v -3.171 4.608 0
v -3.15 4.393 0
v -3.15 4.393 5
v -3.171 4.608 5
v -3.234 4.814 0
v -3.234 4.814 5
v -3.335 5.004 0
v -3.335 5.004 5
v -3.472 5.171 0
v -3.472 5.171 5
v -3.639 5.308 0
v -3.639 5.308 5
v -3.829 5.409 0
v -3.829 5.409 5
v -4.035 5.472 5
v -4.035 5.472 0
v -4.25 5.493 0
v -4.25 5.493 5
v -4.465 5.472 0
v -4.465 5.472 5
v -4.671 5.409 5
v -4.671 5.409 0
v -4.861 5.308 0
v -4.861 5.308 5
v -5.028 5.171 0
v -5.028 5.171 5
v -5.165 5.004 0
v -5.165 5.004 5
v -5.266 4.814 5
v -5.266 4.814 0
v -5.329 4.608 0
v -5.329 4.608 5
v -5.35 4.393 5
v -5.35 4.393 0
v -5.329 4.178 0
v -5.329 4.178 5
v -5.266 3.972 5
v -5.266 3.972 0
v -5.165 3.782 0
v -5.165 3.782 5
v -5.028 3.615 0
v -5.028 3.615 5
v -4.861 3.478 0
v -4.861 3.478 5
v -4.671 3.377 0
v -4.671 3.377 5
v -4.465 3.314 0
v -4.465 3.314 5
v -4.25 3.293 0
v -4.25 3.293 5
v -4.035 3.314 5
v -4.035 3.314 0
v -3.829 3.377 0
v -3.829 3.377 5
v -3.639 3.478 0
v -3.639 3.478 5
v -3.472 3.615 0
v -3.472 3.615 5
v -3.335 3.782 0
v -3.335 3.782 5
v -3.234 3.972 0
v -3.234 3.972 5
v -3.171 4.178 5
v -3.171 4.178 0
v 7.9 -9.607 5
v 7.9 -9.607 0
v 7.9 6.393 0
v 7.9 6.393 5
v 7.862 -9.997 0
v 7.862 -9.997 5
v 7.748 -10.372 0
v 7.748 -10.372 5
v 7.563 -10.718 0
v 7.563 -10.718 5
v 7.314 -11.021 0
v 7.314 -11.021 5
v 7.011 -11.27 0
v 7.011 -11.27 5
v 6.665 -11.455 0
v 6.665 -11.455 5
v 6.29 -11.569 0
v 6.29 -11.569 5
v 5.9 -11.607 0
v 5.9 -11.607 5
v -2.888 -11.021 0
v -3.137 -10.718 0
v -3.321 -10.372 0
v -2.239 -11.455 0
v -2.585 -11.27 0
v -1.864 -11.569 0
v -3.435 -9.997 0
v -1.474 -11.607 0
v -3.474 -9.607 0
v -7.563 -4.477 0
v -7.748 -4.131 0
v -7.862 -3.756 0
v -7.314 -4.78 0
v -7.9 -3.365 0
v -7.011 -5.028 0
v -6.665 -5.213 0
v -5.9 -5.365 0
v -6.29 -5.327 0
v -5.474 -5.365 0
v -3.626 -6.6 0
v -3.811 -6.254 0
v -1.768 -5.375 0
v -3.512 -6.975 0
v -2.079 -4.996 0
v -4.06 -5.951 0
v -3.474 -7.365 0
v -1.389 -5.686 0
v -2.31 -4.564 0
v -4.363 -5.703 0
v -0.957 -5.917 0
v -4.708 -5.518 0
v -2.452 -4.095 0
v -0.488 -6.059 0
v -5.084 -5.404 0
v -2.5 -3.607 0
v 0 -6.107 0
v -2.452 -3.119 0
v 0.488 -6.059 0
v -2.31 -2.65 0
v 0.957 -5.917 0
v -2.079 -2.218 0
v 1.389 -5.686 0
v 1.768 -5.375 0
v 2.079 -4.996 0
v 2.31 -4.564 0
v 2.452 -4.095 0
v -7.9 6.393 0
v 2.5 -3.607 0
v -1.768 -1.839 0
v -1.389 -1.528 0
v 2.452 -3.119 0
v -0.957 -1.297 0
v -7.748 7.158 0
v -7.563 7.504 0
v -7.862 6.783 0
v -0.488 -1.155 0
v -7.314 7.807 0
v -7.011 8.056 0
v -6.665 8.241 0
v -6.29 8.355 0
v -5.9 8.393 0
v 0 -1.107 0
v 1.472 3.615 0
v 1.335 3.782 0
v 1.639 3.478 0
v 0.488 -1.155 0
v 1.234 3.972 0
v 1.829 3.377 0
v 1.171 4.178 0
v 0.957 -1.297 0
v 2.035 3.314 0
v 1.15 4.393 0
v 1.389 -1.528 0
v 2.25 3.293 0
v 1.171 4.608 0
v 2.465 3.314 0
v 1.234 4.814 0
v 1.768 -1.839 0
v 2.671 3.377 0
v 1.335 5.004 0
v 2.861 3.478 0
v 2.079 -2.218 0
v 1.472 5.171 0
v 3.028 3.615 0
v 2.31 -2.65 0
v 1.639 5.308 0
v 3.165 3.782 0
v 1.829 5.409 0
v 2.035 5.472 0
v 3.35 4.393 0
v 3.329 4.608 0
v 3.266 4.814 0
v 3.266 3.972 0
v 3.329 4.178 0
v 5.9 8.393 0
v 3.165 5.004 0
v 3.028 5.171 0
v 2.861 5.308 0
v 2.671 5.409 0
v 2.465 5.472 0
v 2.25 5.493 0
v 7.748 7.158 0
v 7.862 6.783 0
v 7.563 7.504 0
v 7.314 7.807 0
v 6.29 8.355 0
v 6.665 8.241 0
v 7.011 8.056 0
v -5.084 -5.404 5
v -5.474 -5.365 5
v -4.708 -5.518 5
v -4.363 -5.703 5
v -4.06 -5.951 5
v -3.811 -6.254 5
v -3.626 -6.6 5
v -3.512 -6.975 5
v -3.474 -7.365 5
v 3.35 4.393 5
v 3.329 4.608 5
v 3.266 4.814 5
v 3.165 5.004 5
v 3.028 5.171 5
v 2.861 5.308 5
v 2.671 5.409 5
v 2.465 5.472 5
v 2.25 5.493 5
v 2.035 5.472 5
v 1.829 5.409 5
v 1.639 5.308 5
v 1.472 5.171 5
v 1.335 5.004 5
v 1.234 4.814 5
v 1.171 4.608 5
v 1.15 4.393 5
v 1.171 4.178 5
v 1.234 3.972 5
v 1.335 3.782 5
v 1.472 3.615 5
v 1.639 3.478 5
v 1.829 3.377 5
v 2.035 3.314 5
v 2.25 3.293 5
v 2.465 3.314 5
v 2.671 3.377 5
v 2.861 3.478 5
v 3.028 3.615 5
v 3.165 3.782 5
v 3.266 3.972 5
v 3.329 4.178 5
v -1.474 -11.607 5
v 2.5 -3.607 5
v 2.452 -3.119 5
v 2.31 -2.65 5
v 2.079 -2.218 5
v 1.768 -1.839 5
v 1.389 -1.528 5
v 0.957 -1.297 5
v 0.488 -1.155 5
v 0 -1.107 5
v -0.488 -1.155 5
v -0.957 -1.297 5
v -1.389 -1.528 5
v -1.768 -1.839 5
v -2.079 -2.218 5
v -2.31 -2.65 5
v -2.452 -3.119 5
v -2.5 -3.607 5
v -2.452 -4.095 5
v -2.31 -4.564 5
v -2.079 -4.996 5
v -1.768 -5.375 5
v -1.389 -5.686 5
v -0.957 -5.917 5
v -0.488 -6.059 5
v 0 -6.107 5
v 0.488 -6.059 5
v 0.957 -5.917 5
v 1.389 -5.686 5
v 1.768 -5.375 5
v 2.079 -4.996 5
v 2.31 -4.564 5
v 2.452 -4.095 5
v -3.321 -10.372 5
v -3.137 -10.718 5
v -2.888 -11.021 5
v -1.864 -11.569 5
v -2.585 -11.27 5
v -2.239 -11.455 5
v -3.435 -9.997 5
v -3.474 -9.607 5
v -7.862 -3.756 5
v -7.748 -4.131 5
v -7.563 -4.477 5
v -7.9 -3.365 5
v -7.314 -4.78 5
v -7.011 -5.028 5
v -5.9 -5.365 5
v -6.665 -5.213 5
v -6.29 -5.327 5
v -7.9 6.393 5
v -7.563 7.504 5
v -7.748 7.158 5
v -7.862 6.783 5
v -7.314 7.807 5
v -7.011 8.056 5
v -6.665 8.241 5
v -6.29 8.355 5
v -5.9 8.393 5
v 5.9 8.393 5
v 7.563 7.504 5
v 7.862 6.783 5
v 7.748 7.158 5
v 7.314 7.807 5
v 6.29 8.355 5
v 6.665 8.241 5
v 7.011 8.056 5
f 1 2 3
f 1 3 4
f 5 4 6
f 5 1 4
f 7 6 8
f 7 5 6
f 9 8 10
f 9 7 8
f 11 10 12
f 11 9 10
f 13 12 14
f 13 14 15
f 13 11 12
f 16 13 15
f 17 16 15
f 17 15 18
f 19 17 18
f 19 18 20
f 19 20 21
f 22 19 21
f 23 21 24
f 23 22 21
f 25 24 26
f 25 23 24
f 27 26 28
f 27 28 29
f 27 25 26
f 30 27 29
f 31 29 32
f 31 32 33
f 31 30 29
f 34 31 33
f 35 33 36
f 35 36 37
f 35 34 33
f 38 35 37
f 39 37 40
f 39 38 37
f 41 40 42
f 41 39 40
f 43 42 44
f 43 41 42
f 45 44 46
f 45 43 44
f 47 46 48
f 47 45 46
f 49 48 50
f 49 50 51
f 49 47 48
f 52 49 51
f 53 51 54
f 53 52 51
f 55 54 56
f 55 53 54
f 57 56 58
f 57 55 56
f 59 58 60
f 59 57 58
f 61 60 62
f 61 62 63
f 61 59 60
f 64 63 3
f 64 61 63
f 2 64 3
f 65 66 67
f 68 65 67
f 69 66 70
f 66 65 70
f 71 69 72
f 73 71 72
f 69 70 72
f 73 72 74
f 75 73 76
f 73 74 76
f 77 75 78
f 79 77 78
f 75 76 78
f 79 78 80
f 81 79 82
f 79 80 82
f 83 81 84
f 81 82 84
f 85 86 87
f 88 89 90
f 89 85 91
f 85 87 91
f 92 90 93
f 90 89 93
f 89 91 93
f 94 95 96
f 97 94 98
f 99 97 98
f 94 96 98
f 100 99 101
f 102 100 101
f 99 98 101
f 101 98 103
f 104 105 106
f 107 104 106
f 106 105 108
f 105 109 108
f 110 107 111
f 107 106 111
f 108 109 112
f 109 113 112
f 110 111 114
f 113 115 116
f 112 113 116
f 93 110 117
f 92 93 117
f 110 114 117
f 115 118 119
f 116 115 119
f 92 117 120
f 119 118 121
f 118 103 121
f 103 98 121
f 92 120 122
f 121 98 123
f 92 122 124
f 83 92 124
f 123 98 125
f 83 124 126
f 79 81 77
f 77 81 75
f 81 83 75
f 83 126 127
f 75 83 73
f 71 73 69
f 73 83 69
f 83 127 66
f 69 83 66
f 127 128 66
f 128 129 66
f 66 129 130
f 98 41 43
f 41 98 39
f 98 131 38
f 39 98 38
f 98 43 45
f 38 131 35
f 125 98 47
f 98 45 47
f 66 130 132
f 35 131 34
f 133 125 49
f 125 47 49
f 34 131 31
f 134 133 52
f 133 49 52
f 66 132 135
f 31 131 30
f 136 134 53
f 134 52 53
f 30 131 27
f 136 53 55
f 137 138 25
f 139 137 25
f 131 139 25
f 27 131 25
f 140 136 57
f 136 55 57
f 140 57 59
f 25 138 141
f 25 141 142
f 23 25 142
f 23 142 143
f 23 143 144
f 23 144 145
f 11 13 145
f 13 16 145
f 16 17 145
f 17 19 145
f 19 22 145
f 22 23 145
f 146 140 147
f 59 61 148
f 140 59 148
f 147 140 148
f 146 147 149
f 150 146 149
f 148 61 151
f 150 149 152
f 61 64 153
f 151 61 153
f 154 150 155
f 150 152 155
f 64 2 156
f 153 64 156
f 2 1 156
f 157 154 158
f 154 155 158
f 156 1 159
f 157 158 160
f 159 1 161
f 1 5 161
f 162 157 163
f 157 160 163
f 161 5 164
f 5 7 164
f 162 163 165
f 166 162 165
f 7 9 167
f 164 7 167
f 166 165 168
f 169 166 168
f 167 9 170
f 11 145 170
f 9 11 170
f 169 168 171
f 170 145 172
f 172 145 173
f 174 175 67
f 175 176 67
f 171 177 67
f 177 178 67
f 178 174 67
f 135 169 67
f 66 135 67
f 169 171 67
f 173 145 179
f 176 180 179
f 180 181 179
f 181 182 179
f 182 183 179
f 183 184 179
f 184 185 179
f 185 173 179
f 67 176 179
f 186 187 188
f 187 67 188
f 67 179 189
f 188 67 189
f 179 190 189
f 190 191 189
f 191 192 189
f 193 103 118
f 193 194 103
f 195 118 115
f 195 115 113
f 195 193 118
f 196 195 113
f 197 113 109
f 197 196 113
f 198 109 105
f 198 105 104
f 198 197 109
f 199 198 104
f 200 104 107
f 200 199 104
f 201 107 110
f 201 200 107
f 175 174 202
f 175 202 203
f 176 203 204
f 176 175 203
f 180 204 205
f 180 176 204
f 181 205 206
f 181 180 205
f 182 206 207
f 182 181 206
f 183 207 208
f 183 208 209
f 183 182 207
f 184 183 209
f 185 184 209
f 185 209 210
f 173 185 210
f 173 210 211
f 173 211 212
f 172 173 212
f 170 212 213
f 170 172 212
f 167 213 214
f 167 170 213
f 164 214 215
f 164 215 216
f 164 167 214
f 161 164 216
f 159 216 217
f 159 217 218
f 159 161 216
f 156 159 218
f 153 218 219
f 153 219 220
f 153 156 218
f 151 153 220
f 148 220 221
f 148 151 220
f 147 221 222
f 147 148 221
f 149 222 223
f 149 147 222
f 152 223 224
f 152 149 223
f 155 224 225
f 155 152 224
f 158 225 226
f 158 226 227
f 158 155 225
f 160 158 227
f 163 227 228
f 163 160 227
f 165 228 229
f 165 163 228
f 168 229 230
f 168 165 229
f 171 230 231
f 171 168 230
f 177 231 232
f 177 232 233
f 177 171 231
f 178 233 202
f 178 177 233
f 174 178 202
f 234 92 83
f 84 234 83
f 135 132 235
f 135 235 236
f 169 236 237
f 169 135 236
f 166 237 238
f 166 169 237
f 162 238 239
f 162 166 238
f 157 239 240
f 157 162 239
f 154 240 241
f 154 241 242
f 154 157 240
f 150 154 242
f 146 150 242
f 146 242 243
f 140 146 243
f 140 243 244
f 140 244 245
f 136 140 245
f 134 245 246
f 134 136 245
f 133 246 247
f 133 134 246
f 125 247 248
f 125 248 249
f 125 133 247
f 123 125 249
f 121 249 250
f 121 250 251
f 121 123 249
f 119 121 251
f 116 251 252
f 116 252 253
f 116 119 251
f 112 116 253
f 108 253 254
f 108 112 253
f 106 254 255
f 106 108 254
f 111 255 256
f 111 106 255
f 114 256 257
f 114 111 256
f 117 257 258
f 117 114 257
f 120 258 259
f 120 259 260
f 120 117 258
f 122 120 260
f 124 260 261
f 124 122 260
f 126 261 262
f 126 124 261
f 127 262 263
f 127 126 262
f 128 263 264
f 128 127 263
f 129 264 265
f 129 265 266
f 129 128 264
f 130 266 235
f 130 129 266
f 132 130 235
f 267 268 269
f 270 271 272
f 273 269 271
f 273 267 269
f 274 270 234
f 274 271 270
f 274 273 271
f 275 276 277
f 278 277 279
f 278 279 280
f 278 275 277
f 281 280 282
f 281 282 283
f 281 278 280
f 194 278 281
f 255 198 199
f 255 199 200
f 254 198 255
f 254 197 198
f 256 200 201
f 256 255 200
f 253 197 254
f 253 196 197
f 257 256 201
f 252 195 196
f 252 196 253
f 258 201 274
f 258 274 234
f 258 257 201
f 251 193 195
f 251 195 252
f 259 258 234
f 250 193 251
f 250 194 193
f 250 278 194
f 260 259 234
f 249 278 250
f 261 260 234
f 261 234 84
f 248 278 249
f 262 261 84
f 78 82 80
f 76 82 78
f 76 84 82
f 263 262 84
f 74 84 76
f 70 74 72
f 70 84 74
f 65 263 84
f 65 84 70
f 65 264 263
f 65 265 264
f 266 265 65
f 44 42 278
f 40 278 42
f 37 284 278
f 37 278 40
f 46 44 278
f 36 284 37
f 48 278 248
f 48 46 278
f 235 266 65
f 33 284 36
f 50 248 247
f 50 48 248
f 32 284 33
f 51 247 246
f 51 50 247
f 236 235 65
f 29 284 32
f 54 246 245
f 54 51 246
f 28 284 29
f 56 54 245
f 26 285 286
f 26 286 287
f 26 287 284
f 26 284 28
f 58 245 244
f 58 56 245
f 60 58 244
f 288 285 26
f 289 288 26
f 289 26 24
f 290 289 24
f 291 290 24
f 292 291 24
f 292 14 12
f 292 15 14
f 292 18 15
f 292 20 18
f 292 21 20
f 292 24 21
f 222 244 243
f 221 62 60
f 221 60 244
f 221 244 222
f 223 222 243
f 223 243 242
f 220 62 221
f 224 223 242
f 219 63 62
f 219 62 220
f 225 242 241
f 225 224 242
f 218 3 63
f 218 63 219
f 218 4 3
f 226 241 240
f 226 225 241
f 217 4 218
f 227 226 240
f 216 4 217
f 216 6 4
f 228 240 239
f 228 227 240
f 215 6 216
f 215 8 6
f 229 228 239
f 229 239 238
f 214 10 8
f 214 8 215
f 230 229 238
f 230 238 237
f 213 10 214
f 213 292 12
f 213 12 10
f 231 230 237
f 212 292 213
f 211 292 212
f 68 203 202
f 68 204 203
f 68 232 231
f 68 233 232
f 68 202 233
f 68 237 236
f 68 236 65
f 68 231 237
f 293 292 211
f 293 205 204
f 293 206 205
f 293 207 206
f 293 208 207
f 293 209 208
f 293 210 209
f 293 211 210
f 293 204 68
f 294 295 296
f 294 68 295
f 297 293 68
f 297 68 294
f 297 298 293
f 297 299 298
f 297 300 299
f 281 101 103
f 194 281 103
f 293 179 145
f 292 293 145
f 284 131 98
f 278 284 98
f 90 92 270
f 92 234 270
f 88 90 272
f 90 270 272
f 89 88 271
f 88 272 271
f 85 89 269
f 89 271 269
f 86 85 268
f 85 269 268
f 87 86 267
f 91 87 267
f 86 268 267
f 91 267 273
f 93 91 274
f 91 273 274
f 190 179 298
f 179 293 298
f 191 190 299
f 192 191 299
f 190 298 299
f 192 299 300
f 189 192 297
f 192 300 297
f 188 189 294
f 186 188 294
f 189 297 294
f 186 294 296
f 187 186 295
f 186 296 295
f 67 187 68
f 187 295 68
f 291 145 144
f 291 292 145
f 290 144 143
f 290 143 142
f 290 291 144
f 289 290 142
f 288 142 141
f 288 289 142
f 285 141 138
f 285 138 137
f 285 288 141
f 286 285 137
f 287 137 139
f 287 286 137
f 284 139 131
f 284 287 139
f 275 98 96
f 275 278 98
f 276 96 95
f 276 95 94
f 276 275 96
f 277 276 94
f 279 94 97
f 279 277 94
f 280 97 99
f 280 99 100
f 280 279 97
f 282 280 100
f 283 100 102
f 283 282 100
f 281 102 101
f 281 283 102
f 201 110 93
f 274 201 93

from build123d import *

# Parameters (mm, degrees)
F0_R     = 2.5
F0_R_2   = 1.1
F1_DEPTH = 5
F2_R     = 2


with BuildPart() as f1:
    # F0 (on Top) → F1 (new body)
    with BuildSketch(Plane.XY):
        Polygon((7.9, 8.3929710358), (0, 8.3929710358), (-7.9, 8.3929710358), (-7.9, -5.3654396906), (-3.4737212118, -5.3654396906), (-3.4737212118, -11.6070289642), (0, -11.6070289642), (7.9, -11.6070289642), align=None)
        with Locations((0, -3.6070289642)):
            Circle(F0_R, mode=Mode.SUBTRACT)
        with Locations((-4.25, 4.3929710358)):
            Circle(F0_R_2, mode=Mode.SUBTRACT)
        with Locations((2.25, 4.3929710358)):
            Circle(F0_R_2, mode=Mode.SUBTRACT)
    extrude(amount=F1_DEPTH)

    # F2
    f2_edges = [f1.edges().sort_by_distance(p)[0] for p in [
        (7.9, -11.607029, 2.5),
        (7.9, 8.392971, 2.5),
        (-3.473721, -11.607029, 2.5),
        (-7.9, 8.392971, 2.5),
        (-7.9, -5.36544, 2.5),
        (-3.473721, -5.36544, 2.5),
    ]]
    fillet(f2_edges, radius=F2_R)


solid = f1.part
